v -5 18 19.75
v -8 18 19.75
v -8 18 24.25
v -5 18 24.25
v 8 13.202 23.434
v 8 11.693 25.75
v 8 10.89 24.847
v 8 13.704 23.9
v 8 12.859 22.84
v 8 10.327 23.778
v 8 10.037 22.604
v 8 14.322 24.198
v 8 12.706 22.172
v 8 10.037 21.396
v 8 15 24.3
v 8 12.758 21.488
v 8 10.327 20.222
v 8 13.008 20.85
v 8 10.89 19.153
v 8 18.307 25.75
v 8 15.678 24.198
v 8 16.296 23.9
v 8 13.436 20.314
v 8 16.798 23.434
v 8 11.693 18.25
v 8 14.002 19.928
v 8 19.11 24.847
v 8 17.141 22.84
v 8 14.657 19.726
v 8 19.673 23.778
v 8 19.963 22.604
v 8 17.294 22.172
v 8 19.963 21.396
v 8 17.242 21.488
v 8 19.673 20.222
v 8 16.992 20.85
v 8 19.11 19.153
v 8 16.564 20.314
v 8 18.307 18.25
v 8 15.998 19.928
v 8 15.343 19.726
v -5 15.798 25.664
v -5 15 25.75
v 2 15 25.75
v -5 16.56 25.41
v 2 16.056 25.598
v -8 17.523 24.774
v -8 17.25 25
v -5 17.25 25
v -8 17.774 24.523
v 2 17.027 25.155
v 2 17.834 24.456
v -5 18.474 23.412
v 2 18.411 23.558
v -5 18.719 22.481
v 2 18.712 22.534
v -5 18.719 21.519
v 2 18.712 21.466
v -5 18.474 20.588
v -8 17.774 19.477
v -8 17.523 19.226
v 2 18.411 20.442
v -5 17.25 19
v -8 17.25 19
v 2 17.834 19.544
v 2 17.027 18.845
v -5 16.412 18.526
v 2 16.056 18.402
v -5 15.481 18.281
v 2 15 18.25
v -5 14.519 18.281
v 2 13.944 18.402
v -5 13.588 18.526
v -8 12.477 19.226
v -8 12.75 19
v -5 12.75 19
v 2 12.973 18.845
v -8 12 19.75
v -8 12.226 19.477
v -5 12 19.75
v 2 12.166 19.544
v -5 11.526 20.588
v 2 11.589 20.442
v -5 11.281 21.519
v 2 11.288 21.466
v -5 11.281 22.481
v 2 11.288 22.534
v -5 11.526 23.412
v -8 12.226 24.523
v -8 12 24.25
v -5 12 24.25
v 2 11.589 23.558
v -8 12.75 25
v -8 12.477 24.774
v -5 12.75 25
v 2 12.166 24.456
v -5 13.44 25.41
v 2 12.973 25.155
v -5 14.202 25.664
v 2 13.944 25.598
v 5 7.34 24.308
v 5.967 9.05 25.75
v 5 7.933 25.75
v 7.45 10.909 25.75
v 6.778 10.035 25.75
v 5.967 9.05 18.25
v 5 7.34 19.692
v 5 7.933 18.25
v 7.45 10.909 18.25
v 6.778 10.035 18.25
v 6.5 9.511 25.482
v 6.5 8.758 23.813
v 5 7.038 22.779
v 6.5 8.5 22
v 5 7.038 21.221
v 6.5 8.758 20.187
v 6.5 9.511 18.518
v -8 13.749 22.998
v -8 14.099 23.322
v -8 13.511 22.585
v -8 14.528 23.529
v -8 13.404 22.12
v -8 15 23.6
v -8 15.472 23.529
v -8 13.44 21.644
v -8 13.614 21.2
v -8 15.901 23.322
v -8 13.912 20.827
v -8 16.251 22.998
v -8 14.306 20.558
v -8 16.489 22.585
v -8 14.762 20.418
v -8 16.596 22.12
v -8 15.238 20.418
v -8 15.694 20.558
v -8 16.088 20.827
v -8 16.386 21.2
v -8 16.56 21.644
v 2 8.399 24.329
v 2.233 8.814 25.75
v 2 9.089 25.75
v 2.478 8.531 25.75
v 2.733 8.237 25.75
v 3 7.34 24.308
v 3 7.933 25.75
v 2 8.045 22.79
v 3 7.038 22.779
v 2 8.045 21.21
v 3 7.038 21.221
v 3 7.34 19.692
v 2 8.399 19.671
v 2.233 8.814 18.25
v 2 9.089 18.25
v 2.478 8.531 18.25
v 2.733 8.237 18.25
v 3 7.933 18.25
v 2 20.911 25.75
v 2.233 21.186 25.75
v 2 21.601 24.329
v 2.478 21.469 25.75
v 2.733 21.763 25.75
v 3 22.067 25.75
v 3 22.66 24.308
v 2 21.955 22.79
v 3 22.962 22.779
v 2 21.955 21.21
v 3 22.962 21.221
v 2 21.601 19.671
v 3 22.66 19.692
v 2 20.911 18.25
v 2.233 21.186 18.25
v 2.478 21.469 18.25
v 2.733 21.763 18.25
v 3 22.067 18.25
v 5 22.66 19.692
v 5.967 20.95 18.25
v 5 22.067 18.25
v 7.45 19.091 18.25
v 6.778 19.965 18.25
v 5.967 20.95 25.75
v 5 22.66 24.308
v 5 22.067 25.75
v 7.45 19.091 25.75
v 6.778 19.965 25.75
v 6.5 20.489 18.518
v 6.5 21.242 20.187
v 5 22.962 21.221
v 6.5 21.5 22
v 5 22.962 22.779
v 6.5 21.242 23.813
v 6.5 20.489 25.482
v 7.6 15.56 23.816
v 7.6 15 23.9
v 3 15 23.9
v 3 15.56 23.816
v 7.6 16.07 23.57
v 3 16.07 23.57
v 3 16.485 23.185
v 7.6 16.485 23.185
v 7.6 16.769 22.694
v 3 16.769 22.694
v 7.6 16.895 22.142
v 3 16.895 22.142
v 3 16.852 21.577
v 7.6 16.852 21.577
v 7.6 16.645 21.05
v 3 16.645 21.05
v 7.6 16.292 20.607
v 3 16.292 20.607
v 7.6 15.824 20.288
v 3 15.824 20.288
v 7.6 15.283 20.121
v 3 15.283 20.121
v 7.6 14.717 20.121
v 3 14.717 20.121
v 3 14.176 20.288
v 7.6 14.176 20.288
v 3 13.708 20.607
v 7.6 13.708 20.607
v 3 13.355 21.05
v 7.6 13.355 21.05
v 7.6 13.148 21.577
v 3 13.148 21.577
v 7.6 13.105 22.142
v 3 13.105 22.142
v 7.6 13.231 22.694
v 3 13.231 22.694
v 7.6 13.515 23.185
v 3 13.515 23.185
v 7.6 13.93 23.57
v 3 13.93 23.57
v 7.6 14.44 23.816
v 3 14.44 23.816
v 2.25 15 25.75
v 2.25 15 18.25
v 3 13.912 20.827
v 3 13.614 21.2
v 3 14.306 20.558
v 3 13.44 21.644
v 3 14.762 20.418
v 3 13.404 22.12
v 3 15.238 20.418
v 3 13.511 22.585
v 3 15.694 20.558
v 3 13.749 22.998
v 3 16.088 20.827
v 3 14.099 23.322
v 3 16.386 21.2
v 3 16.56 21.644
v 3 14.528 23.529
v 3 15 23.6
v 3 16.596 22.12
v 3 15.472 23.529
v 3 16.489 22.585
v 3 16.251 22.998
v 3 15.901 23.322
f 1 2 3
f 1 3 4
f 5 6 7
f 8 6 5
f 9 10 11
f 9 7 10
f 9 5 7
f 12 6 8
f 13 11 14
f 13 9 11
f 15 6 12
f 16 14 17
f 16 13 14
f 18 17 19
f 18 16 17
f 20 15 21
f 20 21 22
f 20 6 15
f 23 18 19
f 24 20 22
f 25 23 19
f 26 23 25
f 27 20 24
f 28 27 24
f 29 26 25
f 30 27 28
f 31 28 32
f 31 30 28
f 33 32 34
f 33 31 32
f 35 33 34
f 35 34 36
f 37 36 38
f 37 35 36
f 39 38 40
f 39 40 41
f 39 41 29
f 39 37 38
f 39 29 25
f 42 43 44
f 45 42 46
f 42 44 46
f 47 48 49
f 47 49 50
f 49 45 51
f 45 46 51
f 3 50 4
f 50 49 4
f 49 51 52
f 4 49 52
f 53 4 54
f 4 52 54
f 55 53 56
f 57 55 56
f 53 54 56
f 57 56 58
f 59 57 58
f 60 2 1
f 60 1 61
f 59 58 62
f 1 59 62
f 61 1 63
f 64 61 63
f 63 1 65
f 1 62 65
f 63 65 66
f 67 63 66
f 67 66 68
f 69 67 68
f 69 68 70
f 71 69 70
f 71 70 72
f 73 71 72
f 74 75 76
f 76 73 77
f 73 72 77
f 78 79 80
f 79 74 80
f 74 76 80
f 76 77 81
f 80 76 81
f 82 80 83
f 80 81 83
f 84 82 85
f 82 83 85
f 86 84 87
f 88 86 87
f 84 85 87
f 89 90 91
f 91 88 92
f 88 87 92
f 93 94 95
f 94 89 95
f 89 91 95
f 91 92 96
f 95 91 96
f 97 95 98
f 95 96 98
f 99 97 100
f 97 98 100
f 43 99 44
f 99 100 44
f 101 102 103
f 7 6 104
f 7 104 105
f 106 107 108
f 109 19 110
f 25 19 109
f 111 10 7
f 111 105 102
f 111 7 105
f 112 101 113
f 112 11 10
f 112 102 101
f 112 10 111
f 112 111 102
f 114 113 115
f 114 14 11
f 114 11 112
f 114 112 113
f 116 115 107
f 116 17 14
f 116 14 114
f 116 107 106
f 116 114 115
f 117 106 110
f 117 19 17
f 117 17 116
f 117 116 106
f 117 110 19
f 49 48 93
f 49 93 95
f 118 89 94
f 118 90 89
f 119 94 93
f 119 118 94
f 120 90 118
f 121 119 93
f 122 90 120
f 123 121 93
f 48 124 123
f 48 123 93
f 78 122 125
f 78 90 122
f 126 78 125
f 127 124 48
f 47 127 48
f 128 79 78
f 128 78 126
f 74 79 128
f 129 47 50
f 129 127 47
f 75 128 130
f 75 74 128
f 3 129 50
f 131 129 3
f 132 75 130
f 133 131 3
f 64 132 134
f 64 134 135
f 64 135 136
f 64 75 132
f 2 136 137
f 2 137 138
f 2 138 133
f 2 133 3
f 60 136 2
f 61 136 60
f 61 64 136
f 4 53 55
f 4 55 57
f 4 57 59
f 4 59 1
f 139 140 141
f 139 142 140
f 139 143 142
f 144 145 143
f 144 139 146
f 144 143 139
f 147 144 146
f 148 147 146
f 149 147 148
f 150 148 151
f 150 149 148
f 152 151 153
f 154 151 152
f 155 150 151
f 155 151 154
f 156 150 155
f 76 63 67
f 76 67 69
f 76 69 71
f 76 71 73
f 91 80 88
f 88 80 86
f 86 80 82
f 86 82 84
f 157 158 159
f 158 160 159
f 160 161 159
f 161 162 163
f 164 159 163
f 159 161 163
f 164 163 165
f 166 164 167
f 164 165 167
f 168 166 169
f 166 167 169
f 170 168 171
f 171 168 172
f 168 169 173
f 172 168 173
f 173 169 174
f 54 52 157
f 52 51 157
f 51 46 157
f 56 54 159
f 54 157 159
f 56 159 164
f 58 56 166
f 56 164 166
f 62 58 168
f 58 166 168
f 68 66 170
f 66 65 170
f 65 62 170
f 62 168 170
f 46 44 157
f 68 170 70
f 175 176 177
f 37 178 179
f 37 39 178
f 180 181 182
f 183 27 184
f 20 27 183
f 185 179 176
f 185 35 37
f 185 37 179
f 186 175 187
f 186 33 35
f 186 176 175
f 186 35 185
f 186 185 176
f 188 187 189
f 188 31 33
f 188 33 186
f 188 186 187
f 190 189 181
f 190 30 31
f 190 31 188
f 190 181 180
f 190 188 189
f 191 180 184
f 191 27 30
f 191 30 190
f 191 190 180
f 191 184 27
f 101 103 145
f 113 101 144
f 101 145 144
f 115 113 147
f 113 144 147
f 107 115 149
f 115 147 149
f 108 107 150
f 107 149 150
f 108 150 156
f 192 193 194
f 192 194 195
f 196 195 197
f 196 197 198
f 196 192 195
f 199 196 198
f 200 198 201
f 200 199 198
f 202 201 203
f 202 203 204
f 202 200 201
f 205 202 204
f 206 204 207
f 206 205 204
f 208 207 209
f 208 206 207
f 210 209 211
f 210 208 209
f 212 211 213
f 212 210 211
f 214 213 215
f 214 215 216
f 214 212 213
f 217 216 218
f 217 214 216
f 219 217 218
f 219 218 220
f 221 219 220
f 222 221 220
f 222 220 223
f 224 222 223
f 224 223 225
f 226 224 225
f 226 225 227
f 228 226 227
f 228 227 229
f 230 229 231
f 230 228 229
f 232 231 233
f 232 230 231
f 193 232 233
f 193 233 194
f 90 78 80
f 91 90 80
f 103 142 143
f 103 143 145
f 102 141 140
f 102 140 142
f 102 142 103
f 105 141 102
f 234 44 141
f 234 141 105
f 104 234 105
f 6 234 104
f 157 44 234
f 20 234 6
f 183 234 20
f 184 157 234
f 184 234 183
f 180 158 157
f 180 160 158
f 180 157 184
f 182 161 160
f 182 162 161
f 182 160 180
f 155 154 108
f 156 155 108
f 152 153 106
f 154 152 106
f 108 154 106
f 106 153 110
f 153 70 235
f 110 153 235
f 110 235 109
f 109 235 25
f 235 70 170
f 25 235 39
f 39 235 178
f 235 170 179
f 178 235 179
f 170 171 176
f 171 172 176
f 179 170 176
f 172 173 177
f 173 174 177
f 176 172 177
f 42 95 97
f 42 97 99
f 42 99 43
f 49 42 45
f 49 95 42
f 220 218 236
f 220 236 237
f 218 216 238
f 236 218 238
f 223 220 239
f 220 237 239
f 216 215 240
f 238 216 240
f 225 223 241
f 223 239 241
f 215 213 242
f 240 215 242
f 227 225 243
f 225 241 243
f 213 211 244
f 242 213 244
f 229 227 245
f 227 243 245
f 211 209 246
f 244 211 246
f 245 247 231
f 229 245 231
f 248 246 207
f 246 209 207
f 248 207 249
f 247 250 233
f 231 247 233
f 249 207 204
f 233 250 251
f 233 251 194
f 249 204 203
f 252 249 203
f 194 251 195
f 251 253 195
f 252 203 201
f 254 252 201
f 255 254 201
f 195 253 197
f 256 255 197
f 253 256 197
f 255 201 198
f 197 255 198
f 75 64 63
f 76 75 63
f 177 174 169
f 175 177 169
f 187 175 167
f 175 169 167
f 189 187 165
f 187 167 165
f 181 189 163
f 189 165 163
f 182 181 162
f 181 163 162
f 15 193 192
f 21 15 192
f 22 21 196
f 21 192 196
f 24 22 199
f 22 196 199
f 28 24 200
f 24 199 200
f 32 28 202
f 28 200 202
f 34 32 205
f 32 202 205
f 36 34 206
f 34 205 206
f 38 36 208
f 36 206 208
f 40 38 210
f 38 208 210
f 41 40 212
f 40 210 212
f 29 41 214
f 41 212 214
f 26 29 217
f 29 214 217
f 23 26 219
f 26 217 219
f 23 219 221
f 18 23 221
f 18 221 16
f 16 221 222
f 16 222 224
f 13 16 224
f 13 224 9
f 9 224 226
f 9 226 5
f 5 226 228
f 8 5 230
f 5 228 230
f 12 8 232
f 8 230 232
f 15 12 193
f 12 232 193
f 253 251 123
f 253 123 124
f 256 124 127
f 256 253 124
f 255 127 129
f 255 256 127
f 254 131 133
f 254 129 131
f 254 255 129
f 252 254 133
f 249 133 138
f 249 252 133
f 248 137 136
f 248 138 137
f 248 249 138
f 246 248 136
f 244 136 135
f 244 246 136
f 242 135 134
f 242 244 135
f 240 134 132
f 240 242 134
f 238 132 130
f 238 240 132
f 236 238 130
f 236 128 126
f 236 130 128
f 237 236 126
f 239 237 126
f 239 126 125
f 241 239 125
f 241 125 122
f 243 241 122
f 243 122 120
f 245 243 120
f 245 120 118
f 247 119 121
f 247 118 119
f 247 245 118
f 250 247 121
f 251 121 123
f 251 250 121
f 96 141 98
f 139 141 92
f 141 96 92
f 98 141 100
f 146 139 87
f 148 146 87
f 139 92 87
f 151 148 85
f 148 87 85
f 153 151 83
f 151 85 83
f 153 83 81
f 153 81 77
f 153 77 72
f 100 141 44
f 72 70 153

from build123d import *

# Parameters (mm, degrees)
CYLINDER017_R         = 1.9
CYLINDER017_DEPTH     = 5
CYLINDER016_R         = 1.6
CYLINDER016_DEPTH     = 30.25
CYLINDER013_R         = 3.75
CYLINDER013_DEPTH     = 7.25
BOX028_W              = 6
BOX028_H              = 16
BOX028_DEPTH          = 7.5
CHAMFER006006014_SIZE = 3
CYLINDER015_R         = 8
CYLINDER015_DEPTH     = 6
CHAMFER006006017_SIZE = 3
BOX029_W              = 3
BOX029_H              = 6
BOX029_DEPTH          = 6
CYLINDER014_R         = 3.75
CYLINDER014_DEPTH     = 7.25
CHAMFER006006018_SIZE = 0.4
CHAMFER006006020_SIZE = 1


with BuildPart() as cylinder017:
    # Cylinder017 → Cylinder017 (new body)
    with BuildSketch(Plane(origin=(8.25, 15, 22), x_dir=(0, 0, 1), z_dir=(-1, 0, 0))):
        Circle(CYLINDER017_R)
    extrude(amount=CYLINDER017_DEPTH)


with BuildPart() as fusion008:
    # Cylinder016 → Cylinder016 (new body)
    with BuildSketch(Plane(origin=(9.25, 15, 22), x_dir=(0, 0, 1), z_dir=(-1, 0, 0))):
        Circle(CYLINDER016_R)
    extrude(amount=CYLINDER016_DEPTH)

    # Fusion008: union Cylinder017
    add(cylinder017.part)


with BuildPart() as fusion008_1:
    # Fusion008 placement: moved
    add(fusion008.part.moved(Location((-0.25, 0, 0))))


with BuildPart() as cylinder013:
    # Cylinder013 → Cylinder013 (new body)
    with BuildSketch(Plane(origin=(2.25, 15, 22), x_dir=(0, 0, 1), z_dir=(-1, 0, 0))):
        Circle(CYLINDER013_R)
    extrude(amount=CYLINDER013_DEPTH)


with BuildPart() as chamfer006006014:
    # Box028 → Box028 (new body)
    with BuildSketch(Plane(origin=(2, 7, 18.25), x_dir=(1, 0, 0), z_dir=(0, 0, 1))):
        with Locations((3, 8)):
            Rectangle(BOX028_W, BOX028_H)
    extrude(amount=BOX028_DEPTH)

    # Chamfer006006014
    chamfer006006014_edges = [chamfer006006014.edges().sort_by_distance(p)[0] for p in [
        (8, 7, 22),
        (8, 23, 22),
    ]]
    chamfer(chamfer006006014_edges, length=CHAMFER006006014_SIZE)


with BuildPart() as chamfer006006014_1:
    # Chamfer006006014 placement: moved
    add(chamfer006006014.part.moved(Location((0.25, 0, 0))))


with BuildPart() as common003:
    # Cylinder015 → Cylinder015 (new body)
    with BuildSketch(Plane(origin=(2.25, 15, 22), x_dir=(0, 0, -1), z_dir=(1, 0, 0))):
        Circle(CYLINDER015_R)
    extrude(amount=CYLINDER015_DEPTH)

    # Chamfer006006017
    chamfer006006017_edges = [common003.edges().sort_by_distance(p)[0] for p in [
        (8.25, 15, 30),
    ]]
    chamfer(chamfer006006017_edges, length=CHAMFER006006017_SIZE)

    # Common003: intersect Chamfer006006014
    add(chamfer006006014_1.part, mode=Mode.INTERSECT)


with BuildPart() as common003_1:
    # Common003 placement: moved
    add(common003.part.moved(Location((-0.25, 0, 0))))


with BuildPart() as cube028:
    # Box029 → Box029 (new body)
    with BuildSketch(Plane(origin=(-8, 12, 19), x_dir=(1, 0, 0), z_dir=(0, 0, 1))):
        with Locations((1.5, 3)):
            Rectangle(BOX029_W, BOX029_H)
    extrude(amount=BOX029_DEPTH)


with BuildPart() as chamfer006006020:
    # Cylinder014 → Cylinder014 (new body)
    with BuildSketch(Plane(origin=(-3.75, 15, 22), x_dir=(0, 0, 1), z_dir=(-1, 0, 0))):
        Circle(CYLINDER014_R)
    extrude(amount=CYLINDER014_DEPTH)

    # Common: intersect Cube028
    add(cube028.part, mode=Mode.INTERSECT)

    # Fusion011: union Cylinder013, Common003
    add(cylinder013.part)
    add(common003_1.part)

    # Cut002004005002: cut Fusion008
    add(fusion008_1.part, mode=Mode.SUBTRACT)

    # Chamfer006006018
    chamfer006006018_edges = [chamfer006006020.edges().sort_by_distance(p)[0] for p in [
        (8, 15, 20.1),
    ]]
    chamfer(chamfer006006018_edges, length=CHAMFER006006018_SIZE)

    # Chamfer006006020
    chamfer006006020_edges = [chamfer006006020.edges().sort_by_distance(p)[0] for p in [
        (2, 22.763156, 20.067796),
        (2, 22.763156, 23.932204),
        (2, 7.236844, 20.067796),
        (2, 7.236844, 23.932204),
    ]]
    chamfer(chamfer006006020_edges, length=CHAMFER006006020_SIZE)


solid = chamfer006006020.part
